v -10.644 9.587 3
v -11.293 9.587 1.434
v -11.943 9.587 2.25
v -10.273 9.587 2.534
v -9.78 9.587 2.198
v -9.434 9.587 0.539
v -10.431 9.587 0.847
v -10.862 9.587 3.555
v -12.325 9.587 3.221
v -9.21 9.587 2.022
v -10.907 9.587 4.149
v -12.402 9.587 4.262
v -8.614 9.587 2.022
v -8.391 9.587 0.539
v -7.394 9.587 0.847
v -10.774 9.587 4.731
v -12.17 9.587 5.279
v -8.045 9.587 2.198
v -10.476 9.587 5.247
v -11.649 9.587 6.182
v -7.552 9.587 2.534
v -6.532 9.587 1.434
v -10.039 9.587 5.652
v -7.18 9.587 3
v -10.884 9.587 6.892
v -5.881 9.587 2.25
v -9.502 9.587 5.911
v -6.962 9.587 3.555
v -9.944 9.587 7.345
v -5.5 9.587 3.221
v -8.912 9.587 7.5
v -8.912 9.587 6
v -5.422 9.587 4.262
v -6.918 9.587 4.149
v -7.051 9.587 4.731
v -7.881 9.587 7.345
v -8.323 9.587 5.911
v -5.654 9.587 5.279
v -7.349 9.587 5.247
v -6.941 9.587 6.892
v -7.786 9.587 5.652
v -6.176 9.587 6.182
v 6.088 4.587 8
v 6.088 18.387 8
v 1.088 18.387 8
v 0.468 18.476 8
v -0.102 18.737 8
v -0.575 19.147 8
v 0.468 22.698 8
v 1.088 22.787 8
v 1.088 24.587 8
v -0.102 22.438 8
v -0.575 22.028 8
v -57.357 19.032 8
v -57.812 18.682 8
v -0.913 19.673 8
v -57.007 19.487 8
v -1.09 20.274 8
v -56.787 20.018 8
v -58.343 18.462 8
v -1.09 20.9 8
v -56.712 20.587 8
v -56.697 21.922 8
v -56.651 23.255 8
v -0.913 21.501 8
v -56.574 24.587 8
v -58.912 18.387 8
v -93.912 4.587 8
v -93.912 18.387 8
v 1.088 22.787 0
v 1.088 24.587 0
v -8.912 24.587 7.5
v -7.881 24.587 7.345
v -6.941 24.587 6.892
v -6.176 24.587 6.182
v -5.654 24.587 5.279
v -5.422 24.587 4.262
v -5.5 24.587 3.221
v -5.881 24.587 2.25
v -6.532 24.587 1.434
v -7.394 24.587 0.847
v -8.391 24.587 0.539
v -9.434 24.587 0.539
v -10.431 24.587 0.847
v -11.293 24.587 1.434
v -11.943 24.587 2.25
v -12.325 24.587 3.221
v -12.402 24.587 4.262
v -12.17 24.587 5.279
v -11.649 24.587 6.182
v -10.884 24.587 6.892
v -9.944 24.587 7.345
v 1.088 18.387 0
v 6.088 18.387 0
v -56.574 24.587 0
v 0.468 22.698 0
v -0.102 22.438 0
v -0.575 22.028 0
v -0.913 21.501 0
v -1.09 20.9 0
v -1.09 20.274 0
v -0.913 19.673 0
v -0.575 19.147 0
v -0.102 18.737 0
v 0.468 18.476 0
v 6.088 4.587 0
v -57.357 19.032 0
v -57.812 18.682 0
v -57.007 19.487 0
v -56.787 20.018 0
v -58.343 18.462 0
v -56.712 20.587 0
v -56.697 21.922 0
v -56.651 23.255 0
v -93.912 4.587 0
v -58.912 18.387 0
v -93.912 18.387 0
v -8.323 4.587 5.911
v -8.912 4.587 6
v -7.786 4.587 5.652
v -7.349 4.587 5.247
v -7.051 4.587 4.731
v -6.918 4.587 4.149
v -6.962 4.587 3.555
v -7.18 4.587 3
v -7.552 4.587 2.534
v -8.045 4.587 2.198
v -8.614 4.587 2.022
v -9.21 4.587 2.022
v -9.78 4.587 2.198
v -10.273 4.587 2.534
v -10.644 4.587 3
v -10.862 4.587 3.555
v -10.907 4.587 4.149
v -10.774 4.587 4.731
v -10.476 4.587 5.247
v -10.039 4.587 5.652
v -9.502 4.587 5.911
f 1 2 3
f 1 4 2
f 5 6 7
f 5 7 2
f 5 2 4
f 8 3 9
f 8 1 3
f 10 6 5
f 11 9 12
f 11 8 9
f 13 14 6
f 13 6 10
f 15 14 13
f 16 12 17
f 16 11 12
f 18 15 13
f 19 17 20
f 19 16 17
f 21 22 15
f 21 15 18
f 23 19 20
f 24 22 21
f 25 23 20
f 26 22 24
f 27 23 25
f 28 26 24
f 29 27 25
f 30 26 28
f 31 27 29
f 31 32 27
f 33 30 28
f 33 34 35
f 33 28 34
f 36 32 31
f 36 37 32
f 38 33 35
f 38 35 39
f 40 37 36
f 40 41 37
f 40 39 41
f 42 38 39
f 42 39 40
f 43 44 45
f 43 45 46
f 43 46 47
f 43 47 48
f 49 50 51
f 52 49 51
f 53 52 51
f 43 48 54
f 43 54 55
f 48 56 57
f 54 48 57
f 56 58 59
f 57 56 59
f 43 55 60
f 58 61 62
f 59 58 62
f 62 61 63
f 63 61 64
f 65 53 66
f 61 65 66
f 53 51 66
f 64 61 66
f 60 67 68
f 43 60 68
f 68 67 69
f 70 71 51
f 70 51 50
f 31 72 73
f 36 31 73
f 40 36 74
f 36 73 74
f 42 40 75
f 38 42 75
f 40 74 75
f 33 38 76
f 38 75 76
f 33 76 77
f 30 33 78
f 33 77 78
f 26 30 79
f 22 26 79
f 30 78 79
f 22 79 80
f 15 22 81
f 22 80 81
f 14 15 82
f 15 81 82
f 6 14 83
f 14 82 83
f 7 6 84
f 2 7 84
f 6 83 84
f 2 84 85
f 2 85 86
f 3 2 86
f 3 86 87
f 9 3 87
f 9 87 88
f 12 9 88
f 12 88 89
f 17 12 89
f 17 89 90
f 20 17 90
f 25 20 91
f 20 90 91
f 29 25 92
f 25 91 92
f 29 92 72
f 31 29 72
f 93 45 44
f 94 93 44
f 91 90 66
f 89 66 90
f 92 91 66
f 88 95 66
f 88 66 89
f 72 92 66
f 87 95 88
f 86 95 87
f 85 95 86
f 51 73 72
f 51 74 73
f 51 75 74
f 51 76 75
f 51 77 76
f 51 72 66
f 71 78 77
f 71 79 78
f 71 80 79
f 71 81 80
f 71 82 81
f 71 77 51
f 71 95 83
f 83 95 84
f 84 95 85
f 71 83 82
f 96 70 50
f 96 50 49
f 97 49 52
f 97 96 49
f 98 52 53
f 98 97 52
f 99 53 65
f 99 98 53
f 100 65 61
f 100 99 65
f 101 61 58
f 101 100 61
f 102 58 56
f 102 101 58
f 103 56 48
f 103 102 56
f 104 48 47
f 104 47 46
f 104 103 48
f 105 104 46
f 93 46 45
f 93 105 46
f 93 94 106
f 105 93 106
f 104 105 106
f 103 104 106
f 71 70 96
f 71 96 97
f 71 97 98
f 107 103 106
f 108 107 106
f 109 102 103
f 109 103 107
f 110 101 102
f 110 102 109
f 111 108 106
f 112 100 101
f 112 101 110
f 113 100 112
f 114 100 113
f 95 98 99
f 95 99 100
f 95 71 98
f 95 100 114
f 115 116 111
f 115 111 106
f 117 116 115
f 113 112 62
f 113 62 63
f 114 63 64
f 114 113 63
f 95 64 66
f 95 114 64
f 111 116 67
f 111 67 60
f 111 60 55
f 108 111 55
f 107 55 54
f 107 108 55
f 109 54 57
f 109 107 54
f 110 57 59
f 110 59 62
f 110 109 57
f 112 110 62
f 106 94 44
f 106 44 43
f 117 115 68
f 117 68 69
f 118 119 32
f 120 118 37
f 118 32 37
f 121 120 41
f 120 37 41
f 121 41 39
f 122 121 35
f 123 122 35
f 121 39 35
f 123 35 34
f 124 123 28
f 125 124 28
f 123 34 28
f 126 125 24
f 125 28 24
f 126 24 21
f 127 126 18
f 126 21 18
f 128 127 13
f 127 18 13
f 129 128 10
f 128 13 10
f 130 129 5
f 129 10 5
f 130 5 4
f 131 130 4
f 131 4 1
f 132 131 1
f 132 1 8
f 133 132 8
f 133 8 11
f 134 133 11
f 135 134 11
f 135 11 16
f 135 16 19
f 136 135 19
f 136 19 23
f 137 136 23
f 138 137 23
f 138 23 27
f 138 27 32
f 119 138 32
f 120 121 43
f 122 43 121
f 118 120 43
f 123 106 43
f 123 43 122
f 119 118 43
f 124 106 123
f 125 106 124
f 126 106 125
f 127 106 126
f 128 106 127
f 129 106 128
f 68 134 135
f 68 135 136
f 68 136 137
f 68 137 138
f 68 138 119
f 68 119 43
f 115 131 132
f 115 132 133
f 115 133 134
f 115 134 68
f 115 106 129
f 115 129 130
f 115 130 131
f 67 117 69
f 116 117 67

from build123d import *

# Parameters (mm, degrees)
BOSS_EXTRUDE2_DEPTH = 8
SKETCH2_R           = 2
CUT_EXTRUDE1_DEPTH  = 20
SKETCH3_R           = 3.5
CUT_EXTRUDE2_DEPTH  = 15


with BuildPart() as part:
    # Sketch1 → Boss-Extrude2 (new body)
    with BuildSketch(Plane.XY):
        with BuildLine():
            Line((-56.573708053, 24.587270805), (1.087717528, 24.587270805))
            Line((1.087717528, 24.587270805), (1.087717528, 22.787270805))
            ThreePointArc((1.087717528, 22.787270805), (-1.112282472, 20.587270805), (1.087717528, 18.387270805))
            Line((1.087717528, 18.387270805), (6.087717528, 18.387270805))
            Line((6.087717528, 18.387270805), (6.087717528, 4.587270805))
            Line((6.087717528, 4.587270805), (-93.912282472, 4.587270805))
            Line((-93.912282472, 4.587270805), (-93.912282472, 18.387270805))
            Line((-93.912282472, 18.387270805), (-58.912282472, 18.387270805))
            ThreePointArc((-58.912282472, 18.387270805), (-57.356647554, 19.031635886), (-56.712282472, 20.587270805))
            ThreePointArc((-56.712282472, 20.587270805), (-56.677628479, 22.588470624), (-56.573708053, 24.587270805))
        make_face()
    extrude(amount=BOSS_EXTRUDE2_DEPTH)

    # Sketch2 → Cut-Extrude1 (cut)
    with BuildSketch(Plane(origin=(0, 24.587270805, 0), x_dir=(1, 0, 0), z_dir=(0, 1, 0))):
        with Locations(Location((-8.912282472, -4, 0), (0, 0, 270))):
            Circle(SKETCH2_R)
    extrude(amount=-CUT_EXTRUDE1_DEPTH, mode=Mode.SUBTRACT)

    # Sketch3 → Cut-Extrude2 (cut)
    with BuildSketch(Plane(origin=(0, 24.587270805, 0), x_dir=(1, 0, 0), z_dir=(0, 1, 0))):
        with Locations(Location((-8.912282472, -4, 0), (0, 0, 270))):
            Circle(SKETCH3_R)
    extrude(amount=-CUT_EXTRUDE2_DEPTH, mode=Mode.SUBTRACT)


solid = part.part
